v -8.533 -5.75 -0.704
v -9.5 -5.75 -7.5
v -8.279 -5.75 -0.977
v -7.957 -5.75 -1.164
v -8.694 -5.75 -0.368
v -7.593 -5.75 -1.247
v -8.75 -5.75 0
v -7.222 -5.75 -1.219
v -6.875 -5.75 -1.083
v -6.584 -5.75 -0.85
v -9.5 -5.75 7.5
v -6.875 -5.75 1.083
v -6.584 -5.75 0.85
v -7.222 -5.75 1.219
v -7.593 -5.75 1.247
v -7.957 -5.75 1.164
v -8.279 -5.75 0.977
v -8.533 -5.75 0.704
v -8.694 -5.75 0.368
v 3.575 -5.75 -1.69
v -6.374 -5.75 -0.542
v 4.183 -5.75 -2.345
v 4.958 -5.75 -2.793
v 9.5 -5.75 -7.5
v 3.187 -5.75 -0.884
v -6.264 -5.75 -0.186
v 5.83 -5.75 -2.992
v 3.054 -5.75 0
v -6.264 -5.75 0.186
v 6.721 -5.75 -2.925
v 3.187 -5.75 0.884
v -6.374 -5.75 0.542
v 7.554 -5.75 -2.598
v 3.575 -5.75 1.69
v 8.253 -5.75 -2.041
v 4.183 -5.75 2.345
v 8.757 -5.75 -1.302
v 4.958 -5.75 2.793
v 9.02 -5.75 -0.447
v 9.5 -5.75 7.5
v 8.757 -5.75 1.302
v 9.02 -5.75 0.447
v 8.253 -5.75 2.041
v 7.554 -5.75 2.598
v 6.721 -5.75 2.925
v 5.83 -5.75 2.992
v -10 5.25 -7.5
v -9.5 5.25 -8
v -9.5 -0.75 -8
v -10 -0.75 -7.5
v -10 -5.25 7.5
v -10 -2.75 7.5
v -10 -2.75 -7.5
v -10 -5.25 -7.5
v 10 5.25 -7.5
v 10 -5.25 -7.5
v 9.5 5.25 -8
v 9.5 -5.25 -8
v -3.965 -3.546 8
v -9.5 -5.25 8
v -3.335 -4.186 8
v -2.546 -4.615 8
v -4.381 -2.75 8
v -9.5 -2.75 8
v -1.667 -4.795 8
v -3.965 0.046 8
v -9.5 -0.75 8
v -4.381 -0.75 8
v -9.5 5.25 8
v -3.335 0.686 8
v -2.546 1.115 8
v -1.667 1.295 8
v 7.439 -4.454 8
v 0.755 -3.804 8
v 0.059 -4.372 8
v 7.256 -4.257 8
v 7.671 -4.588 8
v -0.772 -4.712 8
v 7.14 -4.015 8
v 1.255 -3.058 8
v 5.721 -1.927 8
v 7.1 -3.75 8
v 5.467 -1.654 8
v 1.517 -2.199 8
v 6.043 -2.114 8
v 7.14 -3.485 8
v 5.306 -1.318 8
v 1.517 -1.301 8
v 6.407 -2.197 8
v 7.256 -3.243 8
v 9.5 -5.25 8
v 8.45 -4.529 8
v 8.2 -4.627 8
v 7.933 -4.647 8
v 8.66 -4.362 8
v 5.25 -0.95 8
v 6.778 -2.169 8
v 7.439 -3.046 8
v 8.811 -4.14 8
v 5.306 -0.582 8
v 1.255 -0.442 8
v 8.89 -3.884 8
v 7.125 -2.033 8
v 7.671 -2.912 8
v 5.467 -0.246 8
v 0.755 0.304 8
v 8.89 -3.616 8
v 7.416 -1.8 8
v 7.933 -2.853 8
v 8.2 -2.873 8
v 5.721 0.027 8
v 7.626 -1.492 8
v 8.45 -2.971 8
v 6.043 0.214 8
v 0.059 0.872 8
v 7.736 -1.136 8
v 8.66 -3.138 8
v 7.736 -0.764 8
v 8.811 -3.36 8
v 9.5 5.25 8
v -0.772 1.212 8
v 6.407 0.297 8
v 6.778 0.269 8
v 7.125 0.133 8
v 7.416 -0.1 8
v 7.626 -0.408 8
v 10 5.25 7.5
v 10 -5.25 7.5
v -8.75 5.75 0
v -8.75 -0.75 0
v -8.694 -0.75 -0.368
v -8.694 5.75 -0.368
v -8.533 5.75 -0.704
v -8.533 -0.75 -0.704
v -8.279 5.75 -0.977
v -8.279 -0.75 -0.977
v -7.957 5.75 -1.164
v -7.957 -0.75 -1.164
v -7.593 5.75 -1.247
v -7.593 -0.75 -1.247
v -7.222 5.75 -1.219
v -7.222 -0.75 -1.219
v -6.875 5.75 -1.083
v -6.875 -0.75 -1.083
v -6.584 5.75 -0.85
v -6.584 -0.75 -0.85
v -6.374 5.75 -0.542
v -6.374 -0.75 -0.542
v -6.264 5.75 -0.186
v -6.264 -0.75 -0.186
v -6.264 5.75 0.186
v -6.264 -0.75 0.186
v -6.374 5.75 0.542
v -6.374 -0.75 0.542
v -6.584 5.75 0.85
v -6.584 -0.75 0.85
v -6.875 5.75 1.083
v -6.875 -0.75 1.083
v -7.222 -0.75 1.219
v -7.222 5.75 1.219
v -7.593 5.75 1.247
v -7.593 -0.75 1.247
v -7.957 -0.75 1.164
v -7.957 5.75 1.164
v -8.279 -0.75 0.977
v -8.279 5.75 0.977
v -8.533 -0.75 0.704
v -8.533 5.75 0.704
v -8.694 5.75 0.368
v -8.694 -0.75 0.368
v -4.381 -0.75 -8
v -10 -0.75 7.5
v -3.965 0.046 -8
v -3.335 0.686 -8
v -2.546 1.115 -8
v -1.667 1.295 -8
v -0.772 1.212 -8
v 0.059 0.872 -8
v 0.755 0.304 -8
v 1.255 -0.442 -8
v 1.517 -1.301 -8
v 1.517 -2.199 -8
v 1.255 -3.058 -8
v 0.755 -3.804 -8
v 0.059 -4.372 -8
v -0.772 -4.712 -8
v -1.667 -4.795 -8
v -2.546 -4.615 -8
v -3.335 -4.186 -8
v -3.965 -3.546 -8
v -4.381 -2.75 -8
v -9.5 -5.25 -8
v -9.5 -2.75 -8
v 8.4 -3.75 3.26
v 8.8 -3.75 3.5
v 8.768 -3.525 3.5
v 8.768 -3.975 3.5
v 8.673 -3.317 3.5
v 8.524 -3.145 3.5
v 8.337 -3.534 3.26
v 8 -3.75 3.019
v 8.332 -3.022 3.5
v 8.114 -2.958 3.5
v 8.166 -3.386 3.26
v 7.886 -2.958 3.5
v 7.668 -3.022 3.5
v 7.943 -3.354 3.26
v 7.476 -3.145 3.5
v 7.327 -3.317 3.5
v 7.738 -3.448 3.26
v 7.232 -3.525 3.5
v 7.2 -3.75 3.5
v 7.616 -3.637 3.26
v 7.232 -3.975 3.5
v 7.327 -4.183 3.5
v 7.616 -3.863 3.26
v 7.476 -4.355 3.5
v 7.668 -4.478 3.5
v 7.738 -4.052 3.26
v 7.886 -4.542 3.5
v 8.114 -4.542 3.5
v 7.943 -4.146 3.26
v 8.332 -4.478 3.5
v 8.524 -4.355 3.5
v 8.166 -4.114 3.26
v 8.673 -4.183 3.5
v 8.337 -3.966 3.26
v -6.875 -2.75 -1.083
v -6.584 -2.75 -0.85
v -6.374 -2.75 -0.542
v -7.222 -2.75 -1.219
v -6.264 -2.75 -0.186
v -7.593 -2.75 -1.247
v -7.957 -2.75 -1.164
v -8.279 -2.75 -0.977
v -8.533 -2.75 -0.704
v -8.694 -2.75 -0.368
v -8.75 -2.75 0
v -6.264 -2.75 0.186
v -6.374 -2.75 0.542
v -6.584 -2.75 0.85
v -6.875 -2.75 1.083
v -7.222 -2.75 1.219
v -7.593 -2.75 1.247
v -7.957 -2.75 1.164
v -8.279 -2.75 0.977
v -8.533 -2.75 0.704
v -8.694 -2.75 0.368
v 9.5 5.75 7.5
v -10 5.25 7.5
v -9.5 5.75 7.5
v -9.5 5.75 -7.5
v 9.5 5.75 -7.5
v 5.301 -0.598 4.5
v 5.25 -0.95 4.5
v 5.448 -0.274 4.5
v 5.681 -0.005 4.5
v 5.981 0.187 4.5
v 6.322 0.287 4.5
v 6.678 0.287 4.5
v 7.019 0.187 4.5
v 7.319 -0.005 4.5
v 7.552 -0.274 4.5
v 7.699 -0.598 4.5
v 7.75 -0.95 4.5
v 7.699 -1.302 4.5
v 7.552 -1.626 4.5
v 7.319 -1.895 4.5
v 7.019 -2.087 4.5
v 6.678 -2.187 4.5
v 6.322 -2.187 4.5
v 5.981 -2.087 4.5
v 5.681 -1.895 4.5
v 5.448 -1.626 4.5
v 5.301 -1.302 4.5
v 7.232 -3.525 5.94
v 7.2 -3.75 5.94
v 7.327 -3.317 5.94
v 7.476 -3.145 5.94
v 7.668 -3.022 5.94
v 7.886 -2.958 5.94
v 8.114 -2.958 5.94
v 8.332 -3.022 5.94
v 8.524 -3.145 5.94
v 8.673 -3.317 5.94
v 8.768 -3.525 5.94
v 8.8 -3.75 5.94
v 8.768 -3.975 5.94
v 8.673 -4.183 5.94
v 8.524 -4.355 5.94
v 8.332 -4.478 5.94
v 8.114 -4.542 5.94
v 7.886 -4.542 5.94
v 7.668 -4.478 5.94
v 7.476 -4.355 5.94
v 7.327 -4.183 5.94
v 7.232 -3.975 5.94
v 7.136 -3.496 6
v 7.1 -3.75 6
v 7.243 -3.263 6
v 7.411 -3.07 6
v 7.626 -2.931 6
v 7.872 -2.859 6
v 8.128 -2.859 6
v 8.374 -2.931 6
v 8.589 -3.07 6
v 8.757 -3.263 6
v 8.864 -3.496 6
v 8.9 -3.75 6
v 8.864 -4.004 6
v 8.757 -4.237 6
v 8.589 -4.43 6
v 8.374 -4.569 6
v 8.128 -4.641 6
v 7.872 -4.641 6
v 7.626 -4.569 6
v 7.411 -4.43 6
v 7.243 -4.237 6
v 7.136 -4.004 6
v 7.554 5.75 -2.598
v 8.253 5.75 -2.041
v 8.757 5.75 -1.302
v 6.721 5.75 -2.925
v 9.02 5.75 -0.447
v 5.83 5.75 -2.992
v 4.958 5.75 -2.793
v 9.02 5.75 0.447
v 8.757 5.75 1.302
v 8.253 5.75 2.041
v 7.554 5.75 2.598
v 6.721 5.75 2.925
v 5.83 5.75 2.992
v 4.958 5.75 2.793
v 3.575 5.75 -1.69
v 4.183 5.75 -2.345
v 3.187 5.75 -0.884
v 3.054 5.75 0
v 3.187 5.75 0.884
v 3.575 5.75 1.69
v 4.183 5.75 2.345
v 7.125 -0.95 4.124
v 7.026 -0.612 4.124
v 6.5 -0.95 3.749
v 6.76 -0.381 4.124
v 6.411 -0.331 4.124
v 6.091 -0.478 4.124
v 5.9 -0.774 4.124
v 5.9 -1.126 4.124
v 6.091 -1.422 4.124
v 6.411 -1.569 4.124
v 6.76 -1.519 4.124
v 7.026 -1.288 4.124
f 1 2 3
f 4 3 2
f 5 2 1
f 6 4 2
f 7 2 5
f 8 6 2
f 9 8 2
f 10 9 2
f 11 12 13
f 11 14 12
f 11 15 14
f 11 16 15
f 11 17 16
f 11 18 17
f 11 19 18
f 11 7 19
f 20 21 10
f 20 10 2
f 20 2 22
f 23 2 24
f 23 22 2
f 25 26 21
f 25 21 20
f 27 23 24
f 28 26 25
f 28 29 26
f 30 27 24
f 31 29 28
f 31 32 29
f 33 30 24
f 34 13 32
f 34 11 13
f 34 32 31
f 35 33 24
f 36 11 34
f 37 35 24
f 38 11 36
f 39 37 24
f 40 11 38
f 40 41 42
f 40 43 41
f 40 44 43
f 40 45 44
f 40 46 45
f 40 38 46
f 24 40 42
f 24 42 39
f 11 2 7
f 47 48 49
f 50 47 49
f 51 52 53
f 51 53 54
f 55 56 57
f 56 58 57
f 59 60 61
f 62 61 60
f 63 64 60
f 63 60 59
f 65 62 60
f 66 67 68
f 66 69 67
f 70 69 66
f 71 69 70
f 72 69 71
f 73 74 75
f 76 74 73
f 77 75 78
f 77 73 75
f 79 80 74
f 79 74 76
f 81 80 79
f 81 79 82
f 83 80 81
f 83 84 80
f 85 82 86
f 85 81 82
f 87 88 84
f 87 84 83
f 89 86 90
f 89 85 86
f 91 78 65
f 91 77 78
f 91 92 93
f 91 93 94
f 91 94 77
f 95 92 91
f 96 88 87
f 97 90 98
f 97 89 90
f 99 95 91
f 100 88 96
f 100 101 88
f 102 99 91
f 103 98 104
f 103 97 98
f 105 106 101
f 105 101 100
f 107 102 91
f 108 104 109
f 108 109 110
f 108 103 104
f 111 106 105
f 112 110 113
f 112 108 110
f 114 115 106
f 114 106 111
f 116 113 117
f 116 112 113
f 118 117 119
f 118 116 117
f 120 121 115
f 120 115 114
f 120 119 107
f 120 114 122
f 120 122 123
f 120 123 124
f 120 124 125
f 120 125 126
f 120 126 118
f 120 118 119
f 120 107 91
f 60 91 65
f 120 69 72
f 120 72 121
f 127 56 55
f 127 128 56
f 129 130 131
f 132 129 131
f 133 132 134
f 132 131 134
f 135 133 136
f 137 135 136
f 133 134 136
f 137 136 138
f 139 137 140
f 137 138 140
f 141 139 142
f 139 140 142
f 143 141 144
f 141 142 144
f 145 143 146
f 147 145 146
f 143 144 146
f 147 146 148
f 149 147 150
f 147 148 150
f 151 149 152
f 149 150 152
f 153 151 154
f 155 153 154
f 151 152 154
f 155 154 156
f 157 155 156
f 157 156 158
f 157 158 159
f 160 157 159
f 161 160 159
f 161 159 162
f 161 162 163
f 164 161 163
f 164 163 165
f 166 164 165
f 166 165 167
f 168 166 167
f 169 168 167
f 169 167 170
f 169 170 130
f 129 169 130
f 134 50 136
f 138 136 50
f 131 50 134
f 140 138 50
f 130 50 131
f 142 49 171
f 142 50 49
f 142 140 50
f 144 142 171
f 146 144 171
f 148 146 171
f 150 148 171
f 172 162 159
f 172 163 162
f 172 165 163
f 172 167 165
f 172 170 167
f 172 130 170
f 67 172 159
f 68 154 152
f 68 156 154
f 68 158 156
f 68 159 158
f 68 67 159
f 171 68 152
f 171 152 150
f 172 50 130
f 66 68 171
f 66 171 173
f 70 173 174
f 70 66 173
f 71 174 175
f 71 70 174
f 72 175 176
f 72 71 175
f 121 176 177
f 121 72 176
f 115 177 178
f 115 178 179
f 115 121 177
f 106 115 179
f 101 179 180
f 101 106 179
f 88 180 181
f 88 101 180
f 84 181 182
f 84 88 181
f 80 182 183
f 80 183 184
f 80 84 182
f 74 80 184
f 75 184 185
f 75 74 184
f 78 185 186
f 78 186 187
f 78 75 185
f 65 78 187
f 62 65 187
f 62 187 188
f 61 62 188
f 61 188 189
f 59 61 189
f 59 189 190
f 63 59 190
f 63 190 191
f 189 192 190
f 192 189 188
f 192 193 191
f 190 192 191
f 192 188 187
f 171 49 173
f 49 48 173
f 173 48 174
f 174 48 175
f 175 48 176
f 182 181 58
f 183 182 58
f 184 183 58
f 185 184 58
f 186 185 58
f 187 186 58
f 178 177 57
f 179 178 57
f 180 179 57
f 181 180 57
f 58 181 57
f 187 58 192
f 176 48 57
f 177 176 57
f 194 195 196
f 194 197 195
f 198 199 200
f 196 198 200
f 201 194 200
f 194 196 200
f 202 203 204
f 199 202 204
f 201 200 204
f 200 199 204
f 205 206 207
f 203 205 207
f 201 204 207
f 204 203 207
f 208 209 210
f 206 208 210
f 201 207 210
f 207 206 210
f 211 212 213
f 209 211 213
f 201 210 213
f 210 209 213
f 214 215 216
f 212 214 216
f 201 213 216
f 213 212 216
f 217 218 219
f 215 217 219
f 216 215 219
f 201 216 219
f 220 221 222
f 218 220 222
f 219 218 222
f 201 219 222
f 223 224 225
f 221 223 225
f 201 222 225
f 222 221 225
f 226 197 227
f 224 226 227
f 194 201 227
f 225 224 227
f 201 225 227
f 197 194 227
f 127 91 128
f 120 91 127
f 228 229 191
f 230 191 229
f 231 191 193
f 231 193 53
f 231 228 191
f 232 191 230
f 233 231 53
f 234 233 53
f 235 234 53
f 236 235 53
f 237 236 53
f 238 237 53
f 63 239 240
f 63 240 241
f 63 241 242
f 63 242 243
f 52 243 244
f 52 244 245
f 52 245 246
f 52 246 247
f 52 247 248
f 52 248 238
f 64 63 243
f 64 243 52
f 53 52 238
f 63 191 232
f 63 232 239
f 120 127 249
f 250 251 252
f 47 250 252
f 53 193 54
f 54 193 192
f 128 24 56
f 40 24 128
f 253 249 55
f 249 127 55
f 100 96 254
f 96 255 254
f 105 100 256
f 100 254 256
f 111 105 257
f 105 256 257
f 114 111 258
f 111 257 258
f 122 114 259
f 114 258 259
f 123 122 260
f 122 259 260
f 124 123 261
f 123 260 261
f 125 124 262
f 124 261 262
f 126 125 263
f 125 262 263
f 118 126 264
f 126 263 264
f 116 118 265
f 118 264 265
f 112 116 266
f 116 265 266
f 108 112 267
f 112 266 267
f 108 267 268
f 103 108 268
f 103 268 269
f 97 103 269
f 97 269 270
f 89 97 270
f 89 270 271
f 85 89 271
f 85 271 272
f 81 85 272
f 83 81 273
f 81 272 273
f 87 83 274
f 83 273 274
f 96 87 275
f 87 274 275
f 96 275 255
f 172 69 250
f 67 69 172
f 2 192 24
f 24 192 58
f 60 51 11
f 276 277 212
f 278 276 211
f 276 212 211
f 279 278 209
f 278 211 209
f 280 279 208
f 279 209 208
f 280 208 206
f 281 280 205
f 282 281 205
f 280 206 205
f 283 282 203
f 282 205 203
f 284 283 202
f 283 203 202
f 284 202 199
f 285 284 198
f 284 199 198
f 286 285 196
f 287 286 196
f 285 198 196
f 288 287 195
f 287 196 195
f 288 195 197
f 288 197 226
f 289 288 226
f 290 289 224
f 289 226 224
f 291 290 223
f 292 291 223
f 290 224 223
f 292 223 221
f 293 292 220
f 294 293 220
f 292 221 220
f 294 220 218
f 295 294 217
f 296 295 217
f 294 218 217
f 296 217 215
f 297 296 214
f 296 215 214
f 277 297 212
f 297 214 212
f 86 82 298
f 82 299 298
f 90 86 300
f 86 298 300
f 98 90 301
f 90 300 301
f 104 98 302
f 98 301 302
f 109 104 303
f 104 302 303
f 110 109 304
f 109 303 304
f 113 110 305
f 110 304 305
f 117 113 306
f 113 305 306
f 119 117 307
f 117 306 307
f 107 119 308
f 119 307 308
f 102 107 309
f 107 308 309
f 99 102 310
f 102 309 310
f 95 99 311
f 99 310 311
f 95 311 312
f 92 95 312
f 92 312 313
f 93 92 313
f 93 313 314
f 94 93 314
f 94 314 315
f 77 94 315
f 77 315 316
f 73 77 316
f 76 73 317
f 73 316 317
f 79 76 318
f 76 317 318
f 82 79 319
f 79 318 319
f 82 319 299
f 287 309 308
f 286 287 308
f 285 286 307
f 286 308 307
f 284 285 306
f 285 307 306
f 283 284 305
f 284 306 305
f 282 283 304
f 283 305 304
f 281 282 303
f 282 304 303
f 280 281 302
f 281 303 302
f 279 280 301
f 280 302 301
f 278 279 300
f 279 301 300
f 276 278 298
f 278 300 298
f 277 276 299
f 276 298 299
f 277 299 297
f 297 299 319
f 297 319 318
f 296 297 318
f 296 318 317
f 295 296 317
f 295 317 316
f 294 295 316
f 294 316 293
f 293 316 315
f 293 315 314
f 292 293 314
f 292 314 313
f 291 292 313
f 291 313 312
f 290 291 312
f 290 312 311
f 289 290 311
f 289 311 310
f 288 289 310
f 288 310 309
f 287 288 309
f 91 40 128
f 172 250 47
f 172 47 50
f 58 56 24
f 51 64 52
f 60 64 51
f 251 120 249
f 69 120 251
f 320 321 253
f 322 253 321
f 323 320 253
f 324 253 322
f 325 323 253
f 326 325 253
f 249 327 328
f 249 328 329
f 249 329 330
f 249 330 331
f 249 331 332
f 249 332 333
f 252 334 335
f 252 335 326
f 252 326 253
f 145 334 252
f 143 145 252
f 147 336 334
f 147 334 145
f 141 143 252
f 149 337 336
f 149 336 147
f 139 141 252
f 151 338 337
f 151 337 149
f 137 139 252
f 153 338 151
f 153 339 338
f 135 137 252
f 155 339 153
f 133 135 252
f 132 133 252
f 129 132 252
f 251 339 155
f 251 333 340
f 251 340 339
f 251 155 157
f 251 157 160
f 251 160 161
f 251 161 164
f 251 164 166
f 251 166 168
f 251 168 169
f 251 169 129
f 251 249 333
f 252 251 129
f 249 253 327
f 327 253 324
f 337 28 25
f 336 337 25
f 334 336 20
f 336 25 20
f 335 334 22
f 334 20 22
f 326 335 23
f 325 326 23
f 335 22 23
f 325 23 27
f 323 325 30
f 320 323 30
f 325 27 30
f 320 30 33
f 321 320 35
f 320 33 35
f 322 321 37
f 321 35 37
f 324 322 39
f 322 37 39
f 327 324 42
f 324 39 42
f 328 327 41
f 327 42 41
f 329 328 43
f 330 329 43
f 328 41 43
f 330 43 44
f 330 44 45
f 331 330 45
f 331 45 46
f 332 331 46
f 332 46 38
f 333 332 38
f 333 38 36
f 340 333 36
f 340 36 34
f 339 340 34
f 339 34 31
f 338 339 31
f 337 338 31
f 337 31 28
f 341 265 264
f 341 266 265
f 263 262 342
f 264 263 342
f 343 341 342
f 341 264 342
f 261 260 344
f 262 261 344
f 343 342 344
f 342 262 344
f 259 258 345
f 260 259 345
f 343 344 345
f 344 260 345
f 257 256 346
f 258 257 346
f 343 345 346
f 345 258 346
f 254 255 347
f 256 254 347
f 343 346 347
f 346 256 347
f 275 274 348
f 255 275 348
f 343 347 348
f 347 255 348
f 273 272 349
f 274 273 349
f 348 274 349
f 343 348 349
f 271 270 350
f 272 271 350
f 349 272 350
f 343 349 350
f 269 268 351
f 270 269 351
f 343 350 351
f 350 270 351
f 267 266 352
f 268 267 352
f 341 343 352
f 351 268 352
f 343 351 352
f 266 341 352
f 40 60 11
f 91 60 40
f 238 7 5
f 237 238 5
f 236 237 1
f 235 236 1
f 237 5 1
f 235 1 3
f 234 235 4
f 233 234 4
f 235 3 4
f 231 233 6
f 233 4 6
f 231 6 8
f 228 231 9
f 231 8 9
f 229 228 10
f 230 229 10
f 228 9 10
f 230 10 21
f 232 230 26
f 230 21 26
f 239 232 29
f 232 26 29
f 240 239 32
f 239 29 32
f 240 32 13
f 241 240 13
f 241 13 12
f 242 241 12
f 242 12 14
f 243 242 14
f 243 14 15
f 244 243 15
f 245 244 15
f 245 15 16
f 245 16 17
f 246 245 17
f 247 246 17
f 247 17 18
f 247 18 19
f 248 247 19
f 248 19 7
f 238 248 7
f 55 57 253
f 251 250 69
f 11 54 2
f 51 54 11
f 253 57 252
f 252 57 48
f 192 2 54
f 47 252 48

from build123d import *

# Parameters (mm, degrees)
BOSS_EXTRUDE1_DEPTH            = 8
CHAMFER1_SIZE                  = 0.5
M3X0_5_TAPPED_HOLE1_D          = 2.5
M3X0_5_TAPPED_HOLE1_DEPTH      = 3.5
M3X0_5_TAPPED_HOLE1_TIP        = 0.751075774
F_1_8_1_8_DIAMETER_HOLE1_D     = 1.8
F_1_8_1_8_DIAMETER_HOLE1_DEPTH = 2
F_1_8_1_8_DIAMETER_HOLE1_TIP   = 0.540774557
F_1_6_1_6_DIAMETER_HOLE1_D     = 1.6
F_1_6_1_6_DIAMETER_HOLE1_DEPTH = 4.5
F_1_6_1_6_DIAMETER_HOLE1_TIP   = 0.480688495
M3X0_5_TAPPED_HOLE2_D          = 2.5
M6X1_0_TAPPED_HOLE1_D          = 6


with BuildPart() as part:
    # Sketch1 → Boss-Extrude1 (new body, symmetric)
    with BuildSketch(Plane.XY):
        with BuildLine():
            Line((-10, -0.75), (-4.381405907, -0.75))
            ThreePointArc((-4.381405907, -0.75), (1.55, -1.75), (-4.381405907, -2.75))
            Line((-4.381405907, -2.75), (-10, -2.75))
            Line((-10, -2.75), (-10, -5.75))
            Line((-10, -5.75), (10, -5.75))
            Line((10, -5.75), (10, 5.75))
            Line((10, 5.75), (-10, 5.75))
            Line((-10, 5.75), (-10, -0.75))
        make_face()
    extrude(amount=BOSS_EXTRUDE1_DEPTH, both=True)

    # Chamfer1
    chamfer1_edges = [part.edges().sort_by_distance(p)[0] for p in [
        (-10, 2.5, 8),
        (0, 5.75, -8),
        (10, 0, -8),
        (10, -5.75, 0),
        (-10, -5.75, 0),
        (-10, 5.75, 0),
        (10, 5.75, 0),
        (-10, -4.25, 8),
        (0, -5.75, 8),
        (10, 0, 8),
        (0, 5.75, 8),
        (0, -5.75, -8),
        (-10, -4.25, -8),
        (-10, 2.5, -8),
    ]]
    chamfer(chamfer1_edges, length=CHAMFER1_SIZE)

    # M3x0.5 Tapped Hole1
    with Locations(Plane.XY.offset(8)):
        with Locations((6.5, -0.95)):
            Hole(M3X0_5_TAPPED_HOLE1_D / 2, depth=M3X0_5_TAPPED_HOLE1_DEPTH)
            with Locations((0, 0, -(M3X0_5_TAPPED_HOLE1_DEPTH + M3X0_5_TAPPED_HOLE1_TIP / 2))):  # 118° drill point
                Cone(0, M3X0_5_TAPPED_HOLE1_D / 2, M3X0_5_TAPPED_HOLE1_TIP, mode=Mode.SUBTRACT)

    # Ø1.8 (1.8) Diameter Hole1
    with Locations(Plane.XY.offset(8)):
        with Locations((8, -3.75)):
            Hole(F_1_8_1_8_DIAMETER_HOLE1_D / 2, depth=F_1_8_1_8_DIAMETER_HOLE1_DEPTH)
            with Locations((0, 0, -(F_1_8_1_8_DIAMETER_HOLE1_DEPTH + F_1_8_1_8_DIAMETER_HOLE1_TIP / 2))):  # 118° drill point
                Cone(0, F_1_8_1_8_DIAMETER_HOLE1_D / 2, F_1_8_1_8_DIAMETER_HOLE1_TIP, mode=Mode.SUBTRACT)

    # Ø1.6 (1.6) Diameter Hole1
    with Locations(Plane.XY.offset(8)):
        with Locations((8, -3.75)):
            Hole(F_1_6_1_6_DIAMETER_HOLE1_D / 2, depth=F_1_6_1_6_DIAMETER_HOLE1_DEPTH)
            with Locations((0, 0, -(F_1_6_1_6_DIAMETER_HOLE1_DEPTH + F_1_6_1_6_DIAMETER_HOLE1_TIP / 2))):  # 118° drill point
                Cone(0, F_1_6_1_6_DIAMETER_HOLE1_D / 2, F_1_6_1_6_DIAMETER_HOLE1_TIP, mode=Mode.SUBTRACT)

    # M3x0.5 Tapped Hole2 (through all)
    with Locations(Plane(origin=(0, 5.75, 0), x_dir=(1, 0, 0), z_dir=(0, 1, 0))):
        with Locations((-7.5, 0)):
            Hole(M3X0_5_TAPPED_HOLE2_D / 2)

    # M6x1.0 Tapped Hole1 (through all)
    with Locations(Plane(origin=(0, 5.75, 0), x_dir=(1, 0, 0), z_dir=(0, 1, 0))):
        with Locations((6.053799896, 0)):
            Hole(M6X1_0_TAPPED_HOLE1_D / 2)


solid = part.part
